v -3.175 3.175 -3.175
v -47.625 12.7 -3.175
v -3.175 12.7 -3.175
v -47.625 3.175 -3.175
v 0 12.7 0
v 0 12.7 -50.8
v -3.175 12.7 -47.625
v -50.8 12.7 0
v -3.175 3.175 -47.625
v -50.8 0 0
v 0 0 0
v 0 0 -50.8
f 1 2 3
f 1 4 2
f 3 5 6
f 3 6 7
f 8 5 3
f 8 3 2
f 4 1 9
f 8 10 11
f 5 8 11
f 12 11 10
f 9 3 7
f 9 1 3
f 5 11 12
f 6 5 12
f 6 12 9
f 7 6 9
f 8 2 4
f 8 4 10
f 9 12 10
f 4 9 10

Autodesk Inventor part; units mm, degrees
ref_plane "YZ Plane" through (0, 0, 0) normal (1, 0, 0) x (0, 1, 0)
ref_plane "XZ Plane" through (0, 0, 0) normal (0, 1, 0) x (-1, 0, 0)
ref_plane "XY Plane" through (0, 0, 0) normal (0, 0, 1) x (1, 0, 0)
sketch "Sketch1" plane through (0, 0, 0) normal (0, 1, 0) x (-1, 0, 0)
  line L0 (0, 0) -> (0, -50.8)
  line L1 (0, -50.8) -> (50.8, 0)
  line L2 (50.8, 0) -> (0, 0)
  dimension "d0" = 50.8
extrude "Extrusion1" add sketch "Sketch1" along normal blind 12.7
shell "Shell1" thickness 3.175 removed faces 2 at (-16.9333, 8.4667, -33.8667) at (-16.9333, 12.7, -16.9333)
properties part number "Corner_Brace"
